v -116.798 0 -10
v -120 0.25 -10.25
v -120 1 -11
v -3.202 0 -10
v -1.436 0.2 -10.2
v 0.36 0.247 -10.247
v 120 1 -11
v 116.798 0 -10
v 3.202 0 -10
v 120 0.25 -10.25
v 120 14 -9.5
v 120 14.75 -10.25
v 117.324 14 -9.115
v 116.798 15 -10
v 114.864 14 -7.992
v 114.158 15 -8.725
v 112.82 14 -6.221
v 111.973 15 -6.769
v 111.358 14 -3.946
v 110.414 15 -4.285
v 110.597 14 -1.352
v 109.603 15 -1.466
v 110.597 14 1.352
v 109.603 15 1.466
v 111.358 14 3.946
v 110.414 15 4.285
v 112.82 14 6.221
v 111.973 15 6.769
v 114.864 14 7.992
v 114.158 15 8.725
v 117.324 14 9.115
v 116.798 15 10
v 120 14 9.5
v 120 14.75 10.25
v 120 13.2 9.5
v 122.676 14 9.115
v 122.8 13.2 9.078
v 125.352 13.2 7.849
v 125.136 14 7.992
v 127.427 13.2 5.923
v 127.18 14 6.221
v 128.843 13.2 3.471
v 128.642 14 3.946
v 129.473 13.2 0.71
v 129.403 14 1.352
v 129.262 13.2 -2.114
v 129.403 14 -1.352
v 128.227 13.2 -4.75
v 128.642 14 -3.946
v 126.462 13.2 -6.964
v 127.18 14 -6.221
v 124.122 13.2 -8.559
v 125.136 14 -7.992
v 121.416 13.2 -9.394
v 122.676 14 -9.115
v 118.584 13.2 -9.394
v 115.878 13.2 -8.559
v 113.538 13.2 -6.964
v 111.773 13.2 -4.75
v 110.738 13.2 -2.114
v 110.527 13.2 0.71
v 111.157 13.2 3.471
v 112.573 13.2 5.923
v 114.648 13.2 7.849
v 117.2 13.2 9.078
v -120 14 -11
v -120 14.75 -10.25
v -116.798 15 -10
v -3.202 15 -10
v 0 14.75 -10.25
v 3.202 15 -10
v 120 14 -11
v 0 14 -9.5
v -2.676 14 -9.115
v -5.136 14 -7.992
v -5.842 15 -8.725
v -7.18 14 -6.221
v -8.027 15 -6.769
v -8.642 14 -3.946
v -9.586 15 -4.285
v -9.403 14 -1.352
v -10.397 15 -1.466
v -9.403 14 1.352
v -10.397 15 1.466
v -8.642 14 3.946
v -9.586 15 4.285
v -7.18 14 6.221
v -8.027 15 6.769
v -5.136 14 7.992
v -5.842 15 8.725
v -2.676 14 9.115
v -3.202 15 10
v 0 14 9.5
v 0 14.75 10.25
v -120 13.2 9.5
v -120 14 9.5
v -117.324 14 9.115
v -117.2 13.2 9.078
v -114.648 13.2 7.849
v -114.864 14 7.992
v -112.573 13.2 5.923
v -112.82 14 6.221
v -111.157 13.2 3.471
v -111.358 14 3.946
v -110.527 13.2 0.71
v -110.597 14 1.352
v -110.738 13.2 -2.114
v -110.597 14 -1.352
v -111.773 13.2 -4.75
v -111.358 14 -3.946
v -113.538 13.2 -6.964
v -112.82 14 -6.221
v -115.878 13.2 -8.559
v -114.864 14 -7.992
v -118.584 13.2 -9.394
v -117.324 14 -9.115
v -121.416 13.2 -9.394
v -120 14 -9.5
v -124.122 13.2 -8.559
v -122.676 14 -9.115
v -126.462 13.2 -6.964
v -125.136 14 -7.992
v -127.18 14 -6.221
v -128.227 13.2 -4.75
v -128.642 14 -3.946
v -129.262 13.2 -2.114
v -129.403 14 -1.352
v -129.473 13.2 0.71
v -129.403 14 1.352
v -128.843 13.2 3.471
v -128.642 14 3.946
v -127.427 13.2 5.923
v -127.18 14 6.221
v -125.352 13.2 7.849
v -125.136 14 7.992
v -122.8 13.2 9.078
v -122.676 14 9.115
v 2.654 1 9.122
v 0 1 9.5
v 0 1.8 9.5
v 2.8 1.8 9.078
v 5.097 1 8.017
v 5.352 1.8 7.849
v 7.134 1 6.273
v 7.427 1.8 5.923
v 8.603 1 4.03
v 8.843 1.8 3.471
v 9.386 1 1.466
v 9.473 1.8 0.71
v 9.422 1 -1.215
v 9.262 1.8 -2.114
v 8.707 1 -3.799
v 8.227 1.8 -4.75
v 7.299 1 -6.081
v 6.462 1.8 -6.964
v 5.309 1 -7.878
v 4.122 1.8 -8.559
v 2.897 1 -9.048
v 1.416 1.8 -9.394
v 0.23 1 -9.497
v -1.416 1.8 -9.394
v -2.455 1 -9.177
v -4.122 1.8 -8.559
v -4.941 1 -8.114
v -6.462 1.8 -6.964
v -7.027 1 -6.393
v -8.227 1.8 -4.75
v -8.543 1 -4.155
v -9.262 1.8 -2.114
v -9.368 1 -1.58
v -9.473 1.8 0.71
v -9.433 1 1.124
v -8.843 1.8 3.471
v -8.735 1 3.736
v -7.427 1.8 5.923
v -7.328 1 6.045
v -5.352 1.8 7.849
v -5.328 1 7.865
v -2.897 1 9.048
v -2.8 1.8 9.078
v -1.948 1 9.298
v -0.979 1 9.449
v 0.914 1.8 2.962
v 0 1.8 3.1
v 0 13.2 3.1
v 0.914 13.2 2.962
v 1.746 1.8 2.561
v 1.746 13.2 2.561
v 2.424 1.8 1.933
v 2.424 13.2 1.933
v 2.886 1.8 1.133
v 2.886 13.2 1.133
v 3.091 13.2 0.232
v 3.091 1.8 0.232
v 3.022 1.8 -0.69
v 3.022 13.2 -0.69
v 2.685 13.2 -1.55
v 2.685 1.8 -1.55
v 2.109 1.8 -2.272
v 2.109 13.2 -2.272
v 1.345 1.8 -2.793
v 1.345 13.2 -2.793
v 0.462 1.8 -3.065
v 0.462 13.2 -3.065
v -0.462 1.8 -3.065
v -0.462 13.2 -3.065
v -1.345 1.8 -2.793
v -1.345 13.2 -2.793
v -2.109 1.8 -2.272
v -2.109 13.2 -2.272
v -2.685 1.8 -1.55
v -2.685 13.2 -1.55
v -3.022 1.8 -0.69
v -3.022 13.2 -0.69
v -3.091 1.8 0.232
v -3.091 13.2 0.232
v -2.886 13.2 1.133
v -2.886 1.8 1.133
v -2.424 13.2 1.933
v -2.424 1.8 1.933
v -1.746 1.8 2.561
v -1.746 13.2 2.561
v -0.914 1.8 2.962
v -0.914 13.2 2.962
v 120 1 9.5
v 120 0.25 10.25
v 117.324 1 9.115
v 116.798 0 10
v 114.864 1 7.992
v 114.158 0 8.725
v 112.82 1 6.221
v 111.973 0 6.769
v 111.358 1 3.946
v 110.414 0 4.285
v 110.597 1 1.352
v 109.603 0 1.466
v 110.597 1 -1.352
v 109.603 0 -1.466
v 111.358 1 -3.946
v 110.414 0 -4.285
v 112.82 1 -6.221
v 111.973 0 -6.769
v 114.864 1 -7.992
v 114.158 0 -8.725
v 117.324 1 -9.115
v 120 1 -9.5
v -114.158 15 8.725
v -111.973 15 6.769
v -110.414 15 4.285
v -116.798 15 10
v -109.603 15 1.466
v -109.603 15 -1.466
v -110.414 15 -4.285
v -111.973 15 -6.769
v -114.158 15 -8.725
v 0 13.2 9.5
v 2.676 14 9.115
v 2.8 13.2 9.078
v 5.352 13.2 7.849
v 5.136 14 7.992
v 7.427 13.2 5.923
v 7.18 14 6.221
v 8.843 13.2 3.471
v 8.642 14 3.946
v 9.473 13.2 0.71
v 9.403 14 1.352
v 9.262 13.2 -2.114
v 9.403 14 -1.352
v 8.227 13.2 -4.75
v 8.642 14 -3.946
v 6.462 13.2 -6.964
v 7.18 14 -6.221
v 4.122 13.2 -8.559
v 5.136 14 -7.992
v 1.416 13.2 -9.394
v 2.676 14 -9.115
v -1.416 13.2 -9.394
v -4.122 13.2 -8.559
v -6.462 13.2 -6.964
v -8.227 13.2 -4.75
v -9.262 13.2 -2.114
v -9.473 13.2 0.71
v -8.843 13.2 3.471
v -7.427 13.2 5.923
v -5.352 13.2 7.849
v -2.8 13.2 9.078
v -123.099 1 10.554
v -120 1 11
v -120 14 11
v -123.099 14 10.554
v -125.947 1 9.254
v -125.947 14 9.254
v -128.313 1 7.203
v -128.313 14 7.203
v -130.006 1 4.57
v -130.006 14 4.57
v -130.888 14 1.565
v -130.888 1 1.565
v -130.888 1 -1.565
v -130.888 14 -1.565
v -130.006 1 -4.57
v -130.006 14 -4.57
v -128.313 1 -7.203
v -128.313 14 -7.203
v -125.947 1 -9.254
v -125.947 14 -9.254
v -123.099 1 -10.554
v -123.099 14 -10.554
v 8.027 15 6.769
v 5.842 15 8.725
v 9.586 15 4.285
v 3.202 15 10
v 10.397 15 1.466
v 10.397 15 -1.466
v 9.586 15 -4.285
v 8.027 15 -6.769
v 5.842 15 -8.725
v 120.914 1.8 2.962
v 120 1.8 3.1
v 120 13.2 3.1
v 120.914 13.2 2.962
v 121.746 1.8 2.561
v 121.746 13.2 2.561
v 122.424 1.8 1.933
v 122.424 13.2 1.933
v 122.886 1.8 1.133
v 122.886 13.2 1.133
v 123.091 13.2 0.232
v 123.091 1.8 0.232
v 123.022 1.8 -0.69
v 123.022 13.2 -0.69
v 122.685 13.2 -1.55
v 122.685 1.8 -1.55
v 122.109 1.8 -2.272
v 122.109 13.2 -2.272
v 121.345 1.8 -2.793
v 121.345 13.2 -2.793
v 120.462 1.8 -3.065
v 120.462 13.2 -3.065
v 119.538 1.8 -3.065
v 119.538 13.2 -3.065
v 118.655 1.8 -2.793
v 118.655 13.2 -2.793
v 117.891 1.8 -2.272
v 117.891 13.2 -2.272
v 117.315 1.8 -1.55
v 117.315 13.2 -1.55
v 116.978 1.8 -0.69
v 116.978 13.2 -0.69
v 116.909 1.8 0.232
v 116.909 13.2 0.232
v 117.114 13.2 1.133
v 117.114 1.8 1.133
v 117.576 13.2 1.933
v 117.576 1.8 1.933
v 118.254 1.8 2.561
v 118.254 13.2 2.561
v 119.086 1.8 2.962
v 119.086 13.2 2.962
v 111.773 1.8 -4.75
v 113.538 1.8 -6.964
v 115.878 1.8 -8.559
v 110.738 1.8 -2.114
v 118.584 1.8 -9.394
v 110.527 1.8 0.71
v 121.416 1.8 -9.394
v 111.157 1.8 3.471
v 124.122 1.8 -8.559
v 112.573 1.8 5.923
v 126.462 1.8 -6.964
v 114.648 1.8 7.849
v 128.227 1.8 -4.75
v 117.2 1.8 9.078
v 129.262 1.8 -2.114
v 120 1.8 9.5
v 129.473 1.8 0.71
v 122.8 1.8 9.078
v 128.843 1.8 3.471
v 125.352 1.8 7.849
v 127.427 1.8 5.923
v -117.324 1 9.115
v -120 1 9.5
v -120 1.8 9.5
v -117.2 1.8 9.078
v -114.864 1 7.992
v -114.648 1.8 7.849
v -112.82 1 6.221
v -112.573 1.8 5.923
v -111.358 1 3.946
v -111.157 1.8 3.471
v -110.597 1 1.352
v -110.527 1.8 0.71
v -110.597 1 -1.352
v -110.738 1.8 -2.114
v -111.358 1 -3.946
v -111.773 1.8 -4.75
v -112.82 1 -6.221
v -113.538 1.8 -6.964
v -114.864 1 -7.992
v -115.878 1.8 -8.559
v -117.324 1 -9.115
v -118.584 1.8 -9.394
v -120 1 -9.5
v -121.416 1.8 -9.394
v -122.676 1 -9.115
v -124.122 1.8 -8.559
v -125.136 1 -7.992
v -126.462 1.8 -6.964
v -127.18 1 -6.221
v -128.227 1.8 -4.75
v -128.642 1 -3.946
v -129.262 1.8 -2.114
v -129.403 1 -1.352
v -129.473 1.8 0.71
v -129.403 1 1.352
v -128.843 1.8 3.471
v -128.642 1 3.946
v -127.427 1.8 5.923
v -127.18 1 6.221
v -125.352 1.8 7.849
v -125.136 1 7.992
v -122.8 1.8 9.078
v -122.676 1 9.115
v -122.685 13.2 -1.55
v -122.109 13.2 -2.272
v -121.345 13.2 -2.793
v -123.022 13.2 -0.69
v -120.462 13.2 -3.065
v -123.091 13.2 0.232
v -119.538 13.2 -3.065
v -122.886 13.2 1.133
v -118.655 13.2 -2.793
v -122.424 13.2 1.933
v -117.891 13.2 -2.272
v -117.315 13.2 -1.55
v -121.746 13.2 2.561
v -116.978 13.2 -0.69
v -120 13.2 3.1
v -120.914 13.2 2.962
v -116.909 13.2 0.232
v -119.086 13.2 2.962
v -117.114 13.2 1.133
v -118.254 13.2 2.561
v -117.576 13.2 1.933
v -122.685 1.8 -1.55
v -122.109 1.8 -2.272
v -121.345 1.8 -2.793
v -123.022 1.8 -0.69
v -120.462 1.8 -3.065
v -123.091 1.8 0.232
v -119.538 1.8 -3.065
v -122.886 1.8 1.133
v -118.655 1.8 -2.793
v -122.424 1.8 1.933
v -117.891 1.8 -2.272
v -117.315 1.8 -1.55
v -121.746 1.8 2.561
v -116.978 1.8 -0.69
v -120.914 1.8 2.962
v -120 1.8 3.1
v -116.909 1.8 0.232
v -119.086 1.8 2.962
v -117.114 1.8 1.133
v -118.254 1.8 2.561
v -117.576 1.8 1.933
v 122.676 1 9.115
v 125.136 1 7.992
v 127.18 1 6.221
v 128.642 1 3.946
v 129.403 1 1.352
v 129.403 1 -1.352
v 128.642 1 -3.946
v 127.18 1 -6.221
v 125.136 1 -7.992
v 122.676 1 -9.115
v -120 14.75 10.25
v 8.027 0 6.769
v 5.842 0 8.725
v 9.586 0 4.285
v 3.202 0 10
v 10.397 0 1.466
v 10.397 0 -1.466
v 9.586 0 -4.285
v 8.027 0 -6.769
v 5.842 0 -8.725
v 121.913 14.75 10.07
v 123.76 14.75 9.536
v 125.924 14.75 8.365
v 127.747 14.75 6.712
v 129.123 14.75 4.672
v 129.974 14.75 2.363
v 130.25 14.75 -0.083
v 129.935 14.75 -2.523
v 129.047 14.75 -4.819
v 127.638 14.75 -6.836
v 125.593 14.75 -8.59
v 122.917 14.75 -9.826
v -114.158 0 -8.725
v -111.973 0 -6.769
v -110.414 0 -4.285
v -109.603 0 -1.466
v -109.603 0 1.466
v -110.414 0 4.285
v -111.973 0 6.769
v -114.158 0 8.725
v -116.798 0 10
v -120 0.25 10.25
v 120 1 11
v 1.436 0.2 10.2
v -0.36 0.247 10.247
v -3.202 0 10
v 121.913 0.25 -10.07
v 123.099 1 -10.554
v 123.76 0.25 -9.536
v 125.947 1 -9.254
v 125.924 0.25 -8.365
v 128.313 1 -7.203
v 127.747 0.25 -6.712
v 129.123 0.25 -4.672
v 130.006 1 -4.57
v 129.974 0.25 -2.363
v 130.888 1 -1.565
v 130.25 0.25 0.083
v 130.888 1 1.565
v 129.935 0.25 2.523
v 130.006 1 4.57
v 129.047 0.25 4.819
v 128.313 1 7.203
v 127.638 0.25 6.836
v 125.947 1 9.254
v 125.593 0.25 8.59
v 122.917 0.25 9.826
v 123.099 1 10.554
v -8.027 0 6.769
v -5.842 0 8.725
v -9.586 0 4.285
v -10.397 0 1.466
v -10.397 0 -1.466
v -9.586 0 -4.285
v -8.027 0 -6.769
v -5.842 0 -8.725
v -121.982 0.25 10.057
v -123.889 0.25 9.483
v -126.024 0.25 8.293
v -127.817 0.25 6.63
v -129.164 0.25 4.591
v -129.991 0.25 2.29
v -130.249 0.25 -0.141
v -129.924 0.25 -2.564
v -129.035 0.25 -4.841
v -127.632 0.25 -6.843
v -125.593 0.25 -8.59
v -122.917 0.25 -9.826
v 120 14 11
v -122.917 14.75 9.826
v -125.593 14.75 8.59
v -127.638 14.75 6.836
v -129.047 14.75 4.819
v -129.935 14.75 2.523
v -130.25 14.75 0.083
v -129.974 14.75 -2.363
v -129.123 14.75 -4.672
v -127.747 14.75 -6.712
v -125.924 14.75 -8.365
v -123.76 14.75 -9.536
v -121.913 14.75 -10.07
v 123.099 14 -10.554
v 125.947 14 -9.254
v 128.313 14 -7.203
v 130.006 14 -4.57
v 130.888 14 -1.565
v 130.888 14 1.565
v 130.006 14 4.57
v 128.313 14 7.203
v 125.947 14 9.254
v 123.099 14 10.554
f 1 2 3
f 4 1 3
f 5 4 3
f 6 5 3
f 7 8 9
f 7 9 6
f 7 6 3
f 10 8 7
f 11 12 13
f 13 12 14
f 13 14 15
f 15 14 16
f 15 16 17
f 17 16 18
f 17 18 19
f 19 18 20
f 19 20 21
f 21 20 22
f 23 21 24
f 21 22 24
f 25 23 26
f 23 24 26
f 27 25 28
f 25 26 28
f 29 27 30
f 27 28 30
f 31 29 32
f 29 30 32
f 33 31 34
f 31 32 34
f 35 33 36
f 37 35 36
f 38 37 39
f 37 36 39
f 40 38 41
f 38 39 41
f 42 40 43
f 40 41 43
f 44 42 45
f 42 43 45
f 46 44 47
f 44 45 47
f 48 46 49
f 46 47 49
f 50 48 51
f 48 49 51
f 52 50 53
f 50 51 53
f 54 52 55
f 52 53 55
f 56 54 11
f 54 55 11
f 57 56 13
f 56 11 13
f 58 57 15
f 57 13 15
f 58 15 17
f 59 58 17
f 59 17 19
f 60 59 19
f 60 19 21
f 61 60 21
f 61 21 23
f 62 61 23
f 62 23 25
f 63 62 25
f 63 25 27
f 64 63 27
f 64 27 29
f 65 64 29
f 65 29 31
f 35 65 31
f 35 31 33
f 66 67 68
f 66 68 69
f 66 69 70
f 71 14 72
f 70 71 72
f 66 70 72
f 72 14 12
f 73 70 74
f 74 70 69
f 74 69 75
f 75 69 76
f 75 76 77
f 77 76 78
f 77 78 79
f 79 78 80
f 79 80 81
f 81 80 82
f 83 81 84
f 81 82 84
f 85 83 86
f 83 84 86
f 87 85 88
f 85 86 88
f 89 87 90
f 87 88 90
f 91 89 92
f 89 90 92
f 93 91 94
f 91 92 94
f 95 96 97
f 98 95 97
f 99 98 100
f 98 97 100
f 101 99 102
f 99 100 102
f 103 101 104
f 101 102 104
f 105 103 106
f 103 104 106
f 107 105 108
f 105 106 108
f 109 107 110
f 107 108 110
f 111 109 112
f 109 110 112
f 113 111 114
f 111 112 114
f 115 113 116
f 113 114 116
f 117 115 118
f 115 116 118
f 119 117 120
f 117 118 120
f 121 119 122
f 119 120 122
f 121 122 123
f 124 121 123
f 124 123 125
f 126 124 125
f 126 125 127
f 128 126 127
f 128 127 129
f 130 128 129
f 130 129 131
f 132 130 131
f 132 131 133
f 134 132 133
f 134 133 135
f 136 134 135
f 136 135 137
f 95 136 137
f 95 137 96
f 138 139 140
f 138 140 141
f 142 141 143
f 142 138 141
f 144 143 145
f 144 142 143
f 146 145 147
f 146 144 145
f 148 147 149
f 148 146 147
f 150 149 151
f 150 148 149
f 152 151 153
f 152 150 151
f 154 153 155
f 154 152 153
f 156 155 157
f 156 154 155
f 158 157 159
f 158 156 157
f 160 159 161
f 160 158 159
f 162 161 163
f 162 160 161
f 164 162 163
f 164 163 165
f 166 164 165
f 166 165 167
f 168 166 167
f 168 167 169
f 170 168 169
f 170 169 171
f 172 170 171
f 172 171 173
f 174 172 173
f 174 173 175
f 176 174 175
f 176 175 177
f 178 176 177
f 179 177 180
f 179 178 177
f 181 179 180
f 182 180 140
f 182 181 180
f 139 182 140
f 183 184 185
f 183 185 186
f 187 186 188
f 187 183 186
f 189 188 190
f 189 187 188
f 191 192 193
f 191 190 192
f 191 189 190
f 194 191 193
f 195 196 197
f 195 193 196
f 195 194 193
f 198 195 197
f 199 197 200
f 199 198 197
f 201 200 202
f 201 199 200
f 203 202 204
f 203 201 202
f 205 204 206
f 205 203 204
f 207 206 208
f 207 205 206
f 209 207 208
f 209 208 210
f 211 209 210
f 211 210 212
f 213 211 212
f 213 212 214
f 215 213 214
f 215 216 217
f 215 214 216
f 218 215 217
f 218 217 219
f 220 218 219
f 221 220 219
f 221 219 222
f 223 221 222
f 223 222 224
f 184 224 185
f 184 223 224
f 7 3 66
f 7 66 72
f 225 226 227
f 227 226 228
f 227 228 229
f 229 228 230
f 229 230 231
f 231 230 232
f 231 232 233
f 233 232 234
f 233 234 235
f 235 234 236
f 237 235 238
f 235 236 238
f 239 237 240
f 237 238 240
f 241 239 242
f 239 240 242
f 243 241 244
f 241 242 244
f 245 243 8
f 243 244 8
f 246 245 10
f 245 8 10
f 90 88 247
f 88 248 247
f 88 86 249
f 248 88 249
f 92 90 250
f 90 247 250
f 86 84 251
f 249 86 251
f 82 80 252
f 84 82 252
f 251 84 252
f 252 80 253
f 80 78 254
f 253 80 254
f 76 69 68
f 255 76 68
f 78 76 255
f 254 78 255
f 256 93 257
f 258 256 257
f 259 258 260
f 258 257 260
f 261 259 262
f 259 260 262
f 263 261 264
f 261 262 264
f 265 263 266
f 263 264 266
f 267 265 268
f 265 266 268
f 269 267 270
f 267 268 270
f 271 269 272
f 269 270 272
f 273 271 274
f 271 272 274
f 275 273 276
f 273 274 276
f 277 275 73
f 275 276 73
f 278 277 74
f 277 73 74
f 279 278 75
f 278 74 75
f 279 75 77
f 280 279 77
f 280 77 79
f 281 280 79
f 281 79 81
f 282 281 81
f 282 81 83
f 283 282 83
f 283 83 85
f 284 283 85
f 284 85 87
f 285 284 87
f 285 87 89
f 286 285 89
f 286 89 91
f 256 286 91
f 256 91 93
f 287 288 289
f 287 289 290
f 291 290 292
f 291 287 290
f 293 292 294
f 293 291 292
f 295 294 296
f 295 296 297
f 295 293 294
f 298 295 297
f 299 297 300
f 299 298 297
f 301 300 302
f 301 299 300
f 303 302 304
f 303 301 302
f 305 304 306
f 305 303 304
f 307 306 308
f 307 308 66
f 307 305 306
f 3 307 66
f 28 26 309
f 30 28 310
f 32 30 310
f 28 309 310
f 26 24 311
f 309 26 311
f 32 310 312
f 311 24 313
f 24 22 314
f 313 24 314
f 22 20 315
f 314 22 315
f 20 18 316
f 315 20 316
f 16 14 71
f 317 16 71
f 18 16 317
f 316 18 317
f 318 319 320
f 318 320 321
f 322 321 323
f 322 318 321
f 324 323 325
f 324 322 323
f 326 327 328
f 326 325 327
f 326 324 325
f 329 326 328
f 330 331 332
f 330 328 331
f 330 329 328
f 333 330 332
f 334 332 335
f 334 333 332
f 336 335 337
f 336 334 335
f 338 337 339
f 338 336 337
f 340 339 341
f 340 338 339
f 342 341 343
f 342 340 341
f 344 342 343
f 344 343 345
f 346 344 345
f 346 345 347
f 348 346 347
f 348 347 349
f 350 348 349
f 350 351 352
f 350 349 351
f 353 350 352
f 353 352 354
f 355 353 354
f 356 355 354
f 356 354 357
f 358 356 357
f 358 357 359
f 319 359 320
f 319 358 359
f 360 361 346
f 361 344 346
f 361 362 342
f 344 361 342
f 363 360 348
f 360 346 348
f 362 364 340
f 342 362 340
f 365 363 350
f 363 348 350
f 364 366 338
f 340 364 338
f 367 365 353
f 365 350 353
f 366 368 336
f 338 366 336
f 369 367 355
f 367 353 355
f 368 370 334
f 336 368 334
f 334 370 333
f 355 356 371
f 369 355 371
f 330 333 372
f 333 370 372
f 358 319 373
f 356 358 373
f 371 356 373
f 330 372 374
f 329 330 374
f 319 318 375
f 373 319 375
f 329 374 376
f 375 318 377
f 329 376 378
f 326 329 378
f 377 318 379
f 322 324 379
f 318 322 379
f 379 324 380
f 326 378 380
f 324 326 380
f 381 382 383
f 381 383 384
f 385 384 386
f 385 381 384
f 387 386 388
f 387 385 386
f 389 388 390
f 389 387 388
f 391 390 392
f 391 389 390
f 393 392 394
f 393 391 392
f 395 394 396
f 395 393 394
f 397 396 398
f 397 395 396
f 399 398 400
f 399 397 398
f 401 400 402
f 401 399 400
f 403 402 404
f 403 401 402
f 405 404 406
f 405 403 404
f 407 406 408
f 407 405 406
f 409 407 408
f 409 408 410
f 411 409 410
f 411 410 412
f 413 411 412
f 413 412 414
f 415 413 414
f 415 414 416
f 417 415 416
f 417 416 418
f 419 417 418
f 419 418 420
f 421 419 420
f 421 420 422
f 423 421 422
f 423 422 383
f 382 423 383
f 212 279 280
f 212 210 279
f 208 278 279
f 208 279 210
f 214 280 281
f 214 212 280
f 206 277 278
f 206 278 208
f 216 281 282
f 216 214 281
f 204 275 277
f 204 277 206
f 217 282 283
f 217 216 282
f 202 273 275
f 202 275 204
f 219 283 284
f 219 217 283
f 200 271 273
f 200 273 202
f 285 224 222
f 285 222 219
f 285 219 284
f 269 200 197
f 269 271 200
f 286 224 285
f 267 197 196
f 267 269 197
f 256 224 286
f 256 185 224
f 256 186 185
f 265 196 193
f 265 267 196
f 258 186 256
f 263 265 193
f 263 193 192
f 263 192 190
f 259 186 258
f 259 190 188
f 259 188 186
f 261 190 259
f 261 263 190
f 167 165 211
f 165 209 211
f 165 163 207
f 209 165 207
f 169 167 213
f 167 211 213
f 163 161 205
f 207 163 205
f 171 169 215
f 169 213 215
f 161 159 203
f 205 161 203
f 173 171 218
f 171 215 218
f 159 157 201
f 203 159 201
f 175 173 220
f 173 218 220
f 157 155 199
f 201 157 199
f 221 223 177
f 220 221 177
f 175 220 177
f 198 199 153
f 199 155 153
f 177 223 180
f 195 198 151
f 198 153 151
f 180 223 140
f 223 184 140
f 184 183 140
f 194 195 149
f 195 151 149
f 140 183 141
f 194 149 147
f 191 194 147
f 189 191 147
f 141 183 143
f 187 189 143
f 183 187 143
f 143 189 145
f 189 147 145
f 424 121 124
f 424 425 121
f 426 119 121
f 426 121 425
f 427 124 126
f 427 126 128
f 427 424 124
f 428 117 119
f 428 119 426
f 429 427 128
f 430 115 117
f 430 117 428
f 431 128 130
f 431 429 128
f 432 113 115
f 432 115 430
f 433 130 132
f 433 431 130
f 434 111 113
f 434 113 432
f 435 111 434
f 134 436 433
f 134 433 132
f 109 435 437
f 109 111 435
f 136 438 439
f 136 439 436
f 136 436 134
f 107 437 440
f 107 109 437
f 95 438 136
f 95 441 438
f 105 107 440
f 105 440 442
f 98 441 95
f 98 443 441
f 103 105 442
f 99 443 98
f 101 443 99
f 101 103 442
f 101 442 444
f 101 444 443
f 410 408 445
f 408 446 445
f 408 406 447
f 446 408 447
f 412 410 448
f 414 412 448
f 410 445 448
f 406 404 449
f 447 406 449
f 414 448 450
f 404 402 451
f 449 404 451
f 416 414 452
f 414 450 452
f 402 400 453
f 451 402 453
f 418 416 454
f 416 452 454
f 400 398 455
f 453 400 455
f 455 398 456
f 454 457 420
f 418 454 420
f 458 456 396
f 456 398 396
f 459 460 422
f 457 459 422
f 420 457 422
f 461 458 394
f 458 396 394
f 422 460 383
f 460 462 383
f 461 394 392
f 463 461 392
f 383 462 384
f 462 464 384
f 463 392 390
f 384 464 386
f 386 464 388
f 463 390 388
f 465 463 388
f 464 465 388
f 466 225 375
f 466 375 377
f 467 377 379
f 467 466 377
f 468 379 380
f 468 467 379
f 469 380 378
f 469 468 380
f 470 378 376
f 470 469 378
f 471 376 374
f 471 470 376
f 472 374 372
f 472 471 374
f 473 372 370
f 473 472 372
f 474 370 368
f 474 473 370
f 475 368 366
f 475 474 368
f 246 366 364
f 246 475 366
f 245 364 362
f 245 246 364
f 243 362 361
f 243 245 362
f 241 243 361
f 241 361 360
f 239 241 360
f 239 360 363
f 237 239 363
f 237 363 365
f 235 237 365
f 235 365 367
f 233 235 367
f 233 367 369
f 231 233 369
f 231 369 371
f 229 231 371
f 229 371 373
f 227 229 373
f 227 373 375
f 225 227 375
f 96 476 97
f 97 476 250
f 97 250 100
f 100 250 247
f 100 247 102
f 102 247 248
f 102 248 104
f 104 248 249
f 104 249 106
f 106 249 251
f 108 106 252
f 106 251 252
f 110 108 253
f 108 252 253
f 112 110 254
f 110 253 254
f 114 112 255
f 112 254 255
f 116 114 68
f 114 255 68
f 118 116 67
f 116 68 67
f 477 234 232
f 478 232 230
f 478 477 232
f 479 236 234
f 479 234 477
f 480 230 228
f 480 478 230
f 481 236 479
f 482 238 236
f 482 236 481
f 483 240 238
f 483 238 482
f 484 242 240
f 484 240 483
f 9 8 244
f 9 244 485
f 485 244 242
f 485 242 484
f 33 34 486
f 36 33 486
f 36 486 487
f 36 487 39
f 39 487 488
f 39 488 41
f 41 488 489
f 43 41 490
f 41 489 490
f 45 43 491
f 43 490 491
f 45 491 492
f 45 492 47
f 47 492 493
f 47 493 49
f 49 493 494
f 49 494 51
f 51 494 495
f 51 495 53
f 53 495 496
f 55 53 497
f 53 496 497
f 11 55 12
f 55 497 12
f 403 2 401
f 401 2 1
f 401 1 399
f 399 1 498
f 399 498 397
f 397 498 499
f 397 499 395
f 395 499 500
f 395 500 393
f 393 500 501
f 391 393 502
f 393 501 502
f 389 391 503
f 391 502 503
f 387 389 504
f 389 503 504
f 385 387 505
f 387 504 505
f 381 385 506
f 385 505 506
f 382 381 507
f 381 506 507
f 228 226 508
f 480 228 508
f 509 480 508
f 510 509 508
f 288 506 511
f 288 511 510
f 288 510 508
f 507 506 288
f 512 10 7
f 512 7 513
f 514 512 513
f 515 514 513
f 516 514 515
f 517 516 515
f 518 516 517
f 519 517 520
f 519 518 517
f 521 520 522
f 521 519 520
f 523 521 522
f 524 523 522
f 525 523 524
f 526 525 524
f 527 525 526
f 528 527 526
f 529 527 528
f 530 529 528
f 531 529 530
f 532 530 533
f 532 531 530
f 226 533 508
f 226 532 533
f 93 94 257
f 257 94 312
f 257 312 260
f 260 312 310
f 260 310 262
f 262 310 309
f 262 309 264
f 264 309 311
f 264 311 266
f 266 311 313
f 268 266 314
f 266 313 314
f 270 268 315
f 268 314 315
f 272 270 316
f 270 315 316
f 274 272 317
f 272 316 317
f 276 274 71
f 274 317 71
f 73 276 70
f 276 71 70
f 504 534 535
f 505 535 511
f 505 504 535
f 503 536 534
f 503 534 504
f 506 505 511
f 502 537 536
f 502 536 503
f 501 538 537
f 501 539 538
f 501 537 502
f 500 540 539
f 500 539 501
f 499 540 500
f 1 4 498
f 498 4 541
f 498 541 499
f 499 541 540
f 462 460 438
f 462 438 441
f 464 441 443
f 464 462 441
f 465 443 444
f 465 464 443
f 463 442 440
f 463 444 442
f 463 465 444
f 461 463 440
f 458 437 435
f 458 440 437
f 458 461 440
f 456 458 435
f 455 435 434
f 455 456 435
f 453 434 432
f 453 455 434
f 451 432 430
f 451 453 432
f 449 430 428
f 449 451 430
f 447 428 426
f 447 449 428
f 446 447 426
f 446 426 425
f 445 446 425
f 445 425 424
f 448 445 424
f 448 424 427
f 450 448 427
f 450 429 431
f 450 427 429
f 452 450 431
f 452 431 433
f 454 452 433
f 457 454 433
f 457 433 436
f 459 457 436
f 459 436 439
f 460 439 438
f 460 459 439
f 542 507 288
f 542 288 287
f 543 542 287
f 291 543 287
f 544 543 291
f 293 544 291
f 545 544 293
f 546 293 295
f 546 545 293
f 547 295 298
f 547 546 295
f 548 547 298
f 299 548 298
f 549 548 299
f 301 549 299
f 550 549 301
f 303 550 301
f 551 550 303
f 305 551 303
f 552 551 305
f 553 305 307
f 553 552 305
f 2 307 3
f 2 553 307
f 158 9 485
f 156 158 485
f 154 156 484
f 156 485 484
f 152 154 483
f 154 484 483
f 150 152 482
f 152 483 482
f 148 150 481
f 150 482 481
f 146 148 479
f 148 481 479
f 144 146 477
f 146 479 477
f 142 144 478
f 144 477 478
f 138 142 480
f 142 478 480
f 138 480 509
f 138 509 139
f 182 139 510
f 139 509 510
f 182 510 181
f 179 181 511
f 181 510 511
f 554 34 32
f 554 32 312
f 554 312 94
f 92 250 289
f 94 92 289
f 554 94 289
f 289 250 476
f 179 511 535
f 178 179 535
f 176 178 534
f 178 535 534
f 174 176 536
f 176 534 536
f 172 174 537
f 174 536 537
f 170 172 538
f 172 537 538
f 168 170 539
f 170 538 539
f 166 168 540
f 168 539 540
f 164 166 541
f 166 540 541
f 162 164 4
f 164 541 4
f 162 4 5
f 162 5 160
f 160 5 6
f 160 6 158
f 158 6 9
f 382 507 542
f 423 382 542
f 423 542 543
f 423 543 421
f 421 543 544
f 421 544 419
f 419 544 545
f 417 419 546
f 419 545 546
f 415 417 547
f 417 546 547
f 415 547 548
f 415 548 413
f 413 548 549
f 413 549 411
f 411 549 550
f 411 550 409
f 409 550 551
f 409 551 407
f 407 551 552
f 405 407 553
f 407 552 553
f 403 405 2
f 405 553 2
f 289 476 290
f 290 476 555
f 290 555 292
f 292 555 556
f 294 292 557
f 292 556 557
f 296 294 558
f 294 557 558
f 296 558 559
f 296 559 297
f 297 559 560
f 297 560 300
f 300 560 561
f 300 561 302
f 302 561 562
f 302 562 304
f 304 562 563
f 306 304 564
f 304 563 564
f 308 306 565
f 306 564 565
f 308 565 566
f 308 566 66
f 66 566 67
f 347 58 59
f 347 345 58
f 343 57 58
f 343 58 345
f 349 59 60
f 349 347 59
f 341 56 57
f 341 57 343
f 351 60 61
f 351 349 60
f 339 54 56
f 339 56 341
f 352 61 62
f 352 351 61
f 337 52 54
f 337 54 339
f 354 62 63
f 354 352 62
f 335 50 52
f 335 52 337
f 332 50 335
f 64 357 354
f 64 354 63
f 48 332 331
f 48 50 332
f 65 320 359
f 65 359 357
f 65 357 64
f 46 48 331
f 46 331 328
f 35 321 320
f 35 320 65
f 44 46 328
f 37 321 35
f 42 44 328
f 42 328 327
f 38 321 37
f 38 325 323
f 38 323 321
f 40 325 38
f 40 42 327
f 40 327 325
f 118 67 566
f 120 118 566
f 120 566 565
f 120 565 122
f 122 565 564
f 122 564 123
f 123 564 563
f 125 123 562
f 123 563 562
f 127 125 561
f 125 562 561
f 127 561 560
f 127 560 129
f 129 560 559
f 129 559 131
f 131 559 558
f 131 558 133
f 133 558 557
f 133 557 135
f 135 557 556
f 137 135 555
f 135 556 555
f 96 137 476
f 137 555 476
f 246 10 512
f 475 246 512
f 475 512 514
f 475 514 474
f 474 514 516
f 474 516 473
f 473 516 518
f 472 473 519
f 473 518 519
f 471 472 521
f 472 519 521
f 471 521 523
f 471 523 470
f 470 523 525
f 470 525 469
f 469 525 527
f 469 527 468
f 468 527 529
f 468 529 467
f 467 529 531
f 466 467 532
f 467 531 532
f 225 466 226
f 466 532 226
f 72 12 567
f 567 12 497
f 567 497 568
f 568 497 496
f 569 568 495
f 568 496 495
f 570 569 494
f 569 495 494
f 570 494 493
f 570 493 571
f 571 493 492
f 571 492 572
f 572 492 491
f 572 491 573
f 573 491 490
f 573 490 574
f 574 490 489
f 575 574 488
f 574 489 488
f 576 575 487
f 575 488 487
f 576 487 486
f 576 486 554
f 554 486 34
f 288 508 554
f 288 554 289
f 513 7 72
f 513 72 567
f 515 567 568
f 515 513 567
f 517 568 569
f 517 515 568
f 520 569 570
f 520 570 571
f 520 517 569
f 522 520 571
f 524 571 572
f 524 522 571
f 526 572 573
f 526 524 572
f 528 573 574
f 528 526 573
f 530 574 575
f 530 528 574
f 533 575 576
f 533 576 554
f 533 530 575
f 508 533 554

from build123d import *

# Parameters (mm, degrees)
SKETCH1_R           = 3.1
BOSS_EXTRUDE1_DEPTH = 15
SKETCH2_R           = 9.5
CUT_EXTRUDE1_DEPTH  = 1.8
CHAMFER2_SIZE       = 1


with BuildPart() as part:
    # Sketch1 → Boss-Extrude1 (new body)
    with BuildSketch(Plane(origin=(0, 0, 0), x_dir=(1, 0, 0), z_dir=(0, 1, 0))):
        with BuildLine():
            Line((-120, 11), (120, 11))
            ThreePointArc((120, 11), (131, 0), (120, -11))
            Line((120, -11), (-120, -11))
            ThreePointArc((-120, -11), (-131, 0), (-120, 11))
        make_face()
        with Locations(Location((-120, 0, 0), (0, 0, 270))):
            Circle(SKETCH1_R, mode=Mode.SUBTRACT)
        with Locations(Location((120, 0, 0), (0, 0, 270))):
            Circle(SKETCH1_R, mode=Mode.SUBTRACT)
        with Locations(Location((0, 0, 0), (0, 0, 270))):
            Circle(SKETCH1_R, mode=Mode.SUBTRACT)
    extrude(amount=BOSS_EXTRUDE1_DEPTH)

    # Sketch2 → Cut-Extrude1 (cut)
    with BuildSketch(Plane(origin=(0, 15, 0), x_dir=(1, 0, 0), z_dir=(0, 1, 0))):
        with Locations(Location((120, 0, 0), (0, 0, 270))):
            Circle(SKETCH2_R)
        with Locations(Location((0, 0, 0), (0, 0, 270))):
            Circle(SKETCH2_R)
        with Locations(Location((-120, 0, 0), (0, 0, 270))):
            Circle(SKETCH2_R)
    cut_extrude1 = extrude(amount=-CUT_EXTRUDE1_DEPTH, mode=Mode.SUBTRACT)

    # Chamfer2
    chamfer2_edges = [part.edges().sort_by_distance(p)[0] for p in [
        (131, 15, 0),
        (0, 15, -11),
        (-131, 15, 0),
        (0, 0, -11),
        (131, 0, 0),
        (0, 0, 11),
        (-131, 0, 0),
        (0, 15, 11),
    ]]
    chamfer(chamfer2_edges, length=CHAMFER2_SIZE)

    # Mirror1: Cut-Extrude1 across plane
    add(cut_extrude1.mirror(Plane.ZX.offset(7.5)), mode=Mode.SUBTRACT)

    # Chamfer1: read off the stored shape, not the designer's step
    # Chamfer1: loft between two sections, ruled curve by curve
    chamfer1_from = [
        Edge.make_three_point_arc((120, 1, 9.5), (110.5, 1, 0), (120, 1, -9.5)),
        Edge.make_three_point_arc((120, 1, -9.5), (129.5, 1, 0), (120, 1, 9.5)),
    ]
    chamfer1_to = [
        Edge.make_three_point_arc((120, 0, 10.5), (109.5, 0, 0), (120, 0, -10.5)),
        Edge.make_three_point_arc((120, 0, -10.5), (130.5, 0, 0), (120, 0, 10.5)),
    ]
    chamfer1 = Solid(Shell([*[Face.make_surface_from_curves(chamfer1_from[k], chamfer1_to[k]) for k in range(2)], Face(Wire(chamfer1_from)), Face(Wire(chamfer1_to))]))
    add(chamfer1, mode=Mode.SUBTRACT)

    # Chamfer1 2: loft between two sections, ruled curve by curve
    chamfer1_2_from = [
        Edge.make_three_point_arc((2.896651441, 1, -9.047619048), (9.047619048, 1, 2.896651441), (-2.896651441, 1, 9.047619048)),
        Edge.make_three_point_arc((-2.896651441, 1, 9.047619048), (-9.047619048, 1, -2.896651441), (2.896651441, 1, -9.047619048)),
    ]
    chamfer1_2_to = [
        Edge.make_three_point_arc((3.201562119, 0, -10), (10, 0, 3.201562119), (-3.201562119, 0, 10)),
        Edge.make_three_point_arc((-3.201562119, 0, 10), (-10, 0, -3.201562119), (3.201562119, 0, -10)),
    ]
    chamfer1_2 = Solid(Shell([*[Face.make_surface_from_curves(chamfer1_2_from[k], chamfer1_2_to[k]) for k in range(2)], Face(Wire(chamfer1_2_from)), Face(Wire(chamfer1_2_to))]))
    add(chamfer1_2, mode=Mode.SUBTRACT)

    # Chamfer1 3: loft between two sections, ruled curve by curve
    chamfer1_3_from = [
        Edge.make_three_point_arc((-120, 1, 9.5), (-129.5, 1, 0), (-120, 1, -9.5)),
        Edge.make_three_point_arc((-120, 1, -9.5), (-110.5, 1, 0), (-120, 1, 9.5)),
    ]
    chamfer1_3_to = [
        Edge.make_three_point_arc((-120, 0, 10.5), (-130.5, 0, 0), (-120, 0, -10.5)),
        Edge.make_three_point_arc((-120, 0, -10.5), (-109.5, 0, 0), (-120, 0, 10.5)),
    ]
    chamfer1_3 = Solid(Shell([*[Face.make_surface_from_curves(chamfer1_3_from[k], chamfer1_3_to[k]) for k in range(2)], Face(Wire(chamfer1_3_from)), Face(Wire(chamfer1_3_to))]))
    add(chamfer1_3, mode=Mode.SUBTRACT)

    # Chamfer1 4: loft between two sections, ruled curve by curve
    chamfer1_4_from = [
        Edge.make_three_point_arc((120, 14, 9.5), (129.5, 14, 0), (120, 14, -9.5)),
        Edge.make_three_point_arc((120, 14, -9.5), (110.5, 14, 0), (120, 14, 9.5)),
    ]
    chamfer1_4_to = [
        Edge.make_three_point_arc((120, 15, 10.5), (130.5, 15, 0), (120, 15, -10.5)),
        Edge.make_three_point_arc((120, 15, -10.5), (109.5, 15, 0), (120, 15, 10.5)),
    ]
    chamfer1_4 = Solid(Shell([*[Face.make_surface_from_curves(chamfer1_4_from[k], chamfer1_4_to[k]) for k in range(2)], Face(Wire(chamfer1_4_from)), Face(Wire(chamfer1_4_to))]))
    add(chamfer1_4, mode=Mode.SUBTRACT)

    # Chamfer1 5: loft between two sections, ruled curve by curve
    chamfer1_5_from = [
        Edge.make_three_point_arc((0, 14, 9.5), (9.5, 14, 0), (0, 14, -9.5)),
        Edge.make_three_point_arc((0, 14, -9.5), (-9.5, 14, 0), (0, 14, 9.5)),
    ]
    chamfer1_5_to = [
        Edge.make_three_point_arc((0, 15, 10.5), (10.5, 15, 0), (0, 15, -10.5)),
        Edge.make_three_point_arc((0, 15, -10.5), (-10.5, 15, 0), (0, 15, 10.5)),
    ]
    chamfer1_5 = Solid(Shell([*[Face.make_surface_from_curves(chamfer1_5_from[k], chamfer1_5_to[k]) for k in range(2)], Face(Wire(chamfer1_5_from)), Face(Wire(chamfer1_5_to))]))
    add(chamfer1_5, mode=Mode.SUBTRACT)

    # Chamfer1 6: loft between two sections, ruled curve by curve
    chamfer1_6_from = [
        Edge.make_three_point_arc((-120, 14, 9.5), (-110.5, 14, 0), (-120, 14, -9.5)),
        Edge.make_three_point_arc((-120, 14, -9.5), (-129.5, 14, 0), (-120, 14, 9.5)),
    ]
    chamfer1_6_to = [
        Edge.make_three_point_arc((-120, 15, 10.5), (-109.5, 15, 0), (-120, 15, -10.5)),
        Edge.make_three_point_arc((-120, 15, -10.5), (-130.5, 15, 0), (-120, 15, 10.5)),
    ]
    chamfer1_6 = Solid(Shell([*[Face.make_surface_from_curves(chamfer1_6_from[k], chamfer1_6_to[k]) for k in range(2)], Face(Wire(chamfer1_6_from)), Face(Wire(chamfer1_6_to))]))
    add(chamfer1_6, mode=Mode.SUBTRACT)


solid = part.part
